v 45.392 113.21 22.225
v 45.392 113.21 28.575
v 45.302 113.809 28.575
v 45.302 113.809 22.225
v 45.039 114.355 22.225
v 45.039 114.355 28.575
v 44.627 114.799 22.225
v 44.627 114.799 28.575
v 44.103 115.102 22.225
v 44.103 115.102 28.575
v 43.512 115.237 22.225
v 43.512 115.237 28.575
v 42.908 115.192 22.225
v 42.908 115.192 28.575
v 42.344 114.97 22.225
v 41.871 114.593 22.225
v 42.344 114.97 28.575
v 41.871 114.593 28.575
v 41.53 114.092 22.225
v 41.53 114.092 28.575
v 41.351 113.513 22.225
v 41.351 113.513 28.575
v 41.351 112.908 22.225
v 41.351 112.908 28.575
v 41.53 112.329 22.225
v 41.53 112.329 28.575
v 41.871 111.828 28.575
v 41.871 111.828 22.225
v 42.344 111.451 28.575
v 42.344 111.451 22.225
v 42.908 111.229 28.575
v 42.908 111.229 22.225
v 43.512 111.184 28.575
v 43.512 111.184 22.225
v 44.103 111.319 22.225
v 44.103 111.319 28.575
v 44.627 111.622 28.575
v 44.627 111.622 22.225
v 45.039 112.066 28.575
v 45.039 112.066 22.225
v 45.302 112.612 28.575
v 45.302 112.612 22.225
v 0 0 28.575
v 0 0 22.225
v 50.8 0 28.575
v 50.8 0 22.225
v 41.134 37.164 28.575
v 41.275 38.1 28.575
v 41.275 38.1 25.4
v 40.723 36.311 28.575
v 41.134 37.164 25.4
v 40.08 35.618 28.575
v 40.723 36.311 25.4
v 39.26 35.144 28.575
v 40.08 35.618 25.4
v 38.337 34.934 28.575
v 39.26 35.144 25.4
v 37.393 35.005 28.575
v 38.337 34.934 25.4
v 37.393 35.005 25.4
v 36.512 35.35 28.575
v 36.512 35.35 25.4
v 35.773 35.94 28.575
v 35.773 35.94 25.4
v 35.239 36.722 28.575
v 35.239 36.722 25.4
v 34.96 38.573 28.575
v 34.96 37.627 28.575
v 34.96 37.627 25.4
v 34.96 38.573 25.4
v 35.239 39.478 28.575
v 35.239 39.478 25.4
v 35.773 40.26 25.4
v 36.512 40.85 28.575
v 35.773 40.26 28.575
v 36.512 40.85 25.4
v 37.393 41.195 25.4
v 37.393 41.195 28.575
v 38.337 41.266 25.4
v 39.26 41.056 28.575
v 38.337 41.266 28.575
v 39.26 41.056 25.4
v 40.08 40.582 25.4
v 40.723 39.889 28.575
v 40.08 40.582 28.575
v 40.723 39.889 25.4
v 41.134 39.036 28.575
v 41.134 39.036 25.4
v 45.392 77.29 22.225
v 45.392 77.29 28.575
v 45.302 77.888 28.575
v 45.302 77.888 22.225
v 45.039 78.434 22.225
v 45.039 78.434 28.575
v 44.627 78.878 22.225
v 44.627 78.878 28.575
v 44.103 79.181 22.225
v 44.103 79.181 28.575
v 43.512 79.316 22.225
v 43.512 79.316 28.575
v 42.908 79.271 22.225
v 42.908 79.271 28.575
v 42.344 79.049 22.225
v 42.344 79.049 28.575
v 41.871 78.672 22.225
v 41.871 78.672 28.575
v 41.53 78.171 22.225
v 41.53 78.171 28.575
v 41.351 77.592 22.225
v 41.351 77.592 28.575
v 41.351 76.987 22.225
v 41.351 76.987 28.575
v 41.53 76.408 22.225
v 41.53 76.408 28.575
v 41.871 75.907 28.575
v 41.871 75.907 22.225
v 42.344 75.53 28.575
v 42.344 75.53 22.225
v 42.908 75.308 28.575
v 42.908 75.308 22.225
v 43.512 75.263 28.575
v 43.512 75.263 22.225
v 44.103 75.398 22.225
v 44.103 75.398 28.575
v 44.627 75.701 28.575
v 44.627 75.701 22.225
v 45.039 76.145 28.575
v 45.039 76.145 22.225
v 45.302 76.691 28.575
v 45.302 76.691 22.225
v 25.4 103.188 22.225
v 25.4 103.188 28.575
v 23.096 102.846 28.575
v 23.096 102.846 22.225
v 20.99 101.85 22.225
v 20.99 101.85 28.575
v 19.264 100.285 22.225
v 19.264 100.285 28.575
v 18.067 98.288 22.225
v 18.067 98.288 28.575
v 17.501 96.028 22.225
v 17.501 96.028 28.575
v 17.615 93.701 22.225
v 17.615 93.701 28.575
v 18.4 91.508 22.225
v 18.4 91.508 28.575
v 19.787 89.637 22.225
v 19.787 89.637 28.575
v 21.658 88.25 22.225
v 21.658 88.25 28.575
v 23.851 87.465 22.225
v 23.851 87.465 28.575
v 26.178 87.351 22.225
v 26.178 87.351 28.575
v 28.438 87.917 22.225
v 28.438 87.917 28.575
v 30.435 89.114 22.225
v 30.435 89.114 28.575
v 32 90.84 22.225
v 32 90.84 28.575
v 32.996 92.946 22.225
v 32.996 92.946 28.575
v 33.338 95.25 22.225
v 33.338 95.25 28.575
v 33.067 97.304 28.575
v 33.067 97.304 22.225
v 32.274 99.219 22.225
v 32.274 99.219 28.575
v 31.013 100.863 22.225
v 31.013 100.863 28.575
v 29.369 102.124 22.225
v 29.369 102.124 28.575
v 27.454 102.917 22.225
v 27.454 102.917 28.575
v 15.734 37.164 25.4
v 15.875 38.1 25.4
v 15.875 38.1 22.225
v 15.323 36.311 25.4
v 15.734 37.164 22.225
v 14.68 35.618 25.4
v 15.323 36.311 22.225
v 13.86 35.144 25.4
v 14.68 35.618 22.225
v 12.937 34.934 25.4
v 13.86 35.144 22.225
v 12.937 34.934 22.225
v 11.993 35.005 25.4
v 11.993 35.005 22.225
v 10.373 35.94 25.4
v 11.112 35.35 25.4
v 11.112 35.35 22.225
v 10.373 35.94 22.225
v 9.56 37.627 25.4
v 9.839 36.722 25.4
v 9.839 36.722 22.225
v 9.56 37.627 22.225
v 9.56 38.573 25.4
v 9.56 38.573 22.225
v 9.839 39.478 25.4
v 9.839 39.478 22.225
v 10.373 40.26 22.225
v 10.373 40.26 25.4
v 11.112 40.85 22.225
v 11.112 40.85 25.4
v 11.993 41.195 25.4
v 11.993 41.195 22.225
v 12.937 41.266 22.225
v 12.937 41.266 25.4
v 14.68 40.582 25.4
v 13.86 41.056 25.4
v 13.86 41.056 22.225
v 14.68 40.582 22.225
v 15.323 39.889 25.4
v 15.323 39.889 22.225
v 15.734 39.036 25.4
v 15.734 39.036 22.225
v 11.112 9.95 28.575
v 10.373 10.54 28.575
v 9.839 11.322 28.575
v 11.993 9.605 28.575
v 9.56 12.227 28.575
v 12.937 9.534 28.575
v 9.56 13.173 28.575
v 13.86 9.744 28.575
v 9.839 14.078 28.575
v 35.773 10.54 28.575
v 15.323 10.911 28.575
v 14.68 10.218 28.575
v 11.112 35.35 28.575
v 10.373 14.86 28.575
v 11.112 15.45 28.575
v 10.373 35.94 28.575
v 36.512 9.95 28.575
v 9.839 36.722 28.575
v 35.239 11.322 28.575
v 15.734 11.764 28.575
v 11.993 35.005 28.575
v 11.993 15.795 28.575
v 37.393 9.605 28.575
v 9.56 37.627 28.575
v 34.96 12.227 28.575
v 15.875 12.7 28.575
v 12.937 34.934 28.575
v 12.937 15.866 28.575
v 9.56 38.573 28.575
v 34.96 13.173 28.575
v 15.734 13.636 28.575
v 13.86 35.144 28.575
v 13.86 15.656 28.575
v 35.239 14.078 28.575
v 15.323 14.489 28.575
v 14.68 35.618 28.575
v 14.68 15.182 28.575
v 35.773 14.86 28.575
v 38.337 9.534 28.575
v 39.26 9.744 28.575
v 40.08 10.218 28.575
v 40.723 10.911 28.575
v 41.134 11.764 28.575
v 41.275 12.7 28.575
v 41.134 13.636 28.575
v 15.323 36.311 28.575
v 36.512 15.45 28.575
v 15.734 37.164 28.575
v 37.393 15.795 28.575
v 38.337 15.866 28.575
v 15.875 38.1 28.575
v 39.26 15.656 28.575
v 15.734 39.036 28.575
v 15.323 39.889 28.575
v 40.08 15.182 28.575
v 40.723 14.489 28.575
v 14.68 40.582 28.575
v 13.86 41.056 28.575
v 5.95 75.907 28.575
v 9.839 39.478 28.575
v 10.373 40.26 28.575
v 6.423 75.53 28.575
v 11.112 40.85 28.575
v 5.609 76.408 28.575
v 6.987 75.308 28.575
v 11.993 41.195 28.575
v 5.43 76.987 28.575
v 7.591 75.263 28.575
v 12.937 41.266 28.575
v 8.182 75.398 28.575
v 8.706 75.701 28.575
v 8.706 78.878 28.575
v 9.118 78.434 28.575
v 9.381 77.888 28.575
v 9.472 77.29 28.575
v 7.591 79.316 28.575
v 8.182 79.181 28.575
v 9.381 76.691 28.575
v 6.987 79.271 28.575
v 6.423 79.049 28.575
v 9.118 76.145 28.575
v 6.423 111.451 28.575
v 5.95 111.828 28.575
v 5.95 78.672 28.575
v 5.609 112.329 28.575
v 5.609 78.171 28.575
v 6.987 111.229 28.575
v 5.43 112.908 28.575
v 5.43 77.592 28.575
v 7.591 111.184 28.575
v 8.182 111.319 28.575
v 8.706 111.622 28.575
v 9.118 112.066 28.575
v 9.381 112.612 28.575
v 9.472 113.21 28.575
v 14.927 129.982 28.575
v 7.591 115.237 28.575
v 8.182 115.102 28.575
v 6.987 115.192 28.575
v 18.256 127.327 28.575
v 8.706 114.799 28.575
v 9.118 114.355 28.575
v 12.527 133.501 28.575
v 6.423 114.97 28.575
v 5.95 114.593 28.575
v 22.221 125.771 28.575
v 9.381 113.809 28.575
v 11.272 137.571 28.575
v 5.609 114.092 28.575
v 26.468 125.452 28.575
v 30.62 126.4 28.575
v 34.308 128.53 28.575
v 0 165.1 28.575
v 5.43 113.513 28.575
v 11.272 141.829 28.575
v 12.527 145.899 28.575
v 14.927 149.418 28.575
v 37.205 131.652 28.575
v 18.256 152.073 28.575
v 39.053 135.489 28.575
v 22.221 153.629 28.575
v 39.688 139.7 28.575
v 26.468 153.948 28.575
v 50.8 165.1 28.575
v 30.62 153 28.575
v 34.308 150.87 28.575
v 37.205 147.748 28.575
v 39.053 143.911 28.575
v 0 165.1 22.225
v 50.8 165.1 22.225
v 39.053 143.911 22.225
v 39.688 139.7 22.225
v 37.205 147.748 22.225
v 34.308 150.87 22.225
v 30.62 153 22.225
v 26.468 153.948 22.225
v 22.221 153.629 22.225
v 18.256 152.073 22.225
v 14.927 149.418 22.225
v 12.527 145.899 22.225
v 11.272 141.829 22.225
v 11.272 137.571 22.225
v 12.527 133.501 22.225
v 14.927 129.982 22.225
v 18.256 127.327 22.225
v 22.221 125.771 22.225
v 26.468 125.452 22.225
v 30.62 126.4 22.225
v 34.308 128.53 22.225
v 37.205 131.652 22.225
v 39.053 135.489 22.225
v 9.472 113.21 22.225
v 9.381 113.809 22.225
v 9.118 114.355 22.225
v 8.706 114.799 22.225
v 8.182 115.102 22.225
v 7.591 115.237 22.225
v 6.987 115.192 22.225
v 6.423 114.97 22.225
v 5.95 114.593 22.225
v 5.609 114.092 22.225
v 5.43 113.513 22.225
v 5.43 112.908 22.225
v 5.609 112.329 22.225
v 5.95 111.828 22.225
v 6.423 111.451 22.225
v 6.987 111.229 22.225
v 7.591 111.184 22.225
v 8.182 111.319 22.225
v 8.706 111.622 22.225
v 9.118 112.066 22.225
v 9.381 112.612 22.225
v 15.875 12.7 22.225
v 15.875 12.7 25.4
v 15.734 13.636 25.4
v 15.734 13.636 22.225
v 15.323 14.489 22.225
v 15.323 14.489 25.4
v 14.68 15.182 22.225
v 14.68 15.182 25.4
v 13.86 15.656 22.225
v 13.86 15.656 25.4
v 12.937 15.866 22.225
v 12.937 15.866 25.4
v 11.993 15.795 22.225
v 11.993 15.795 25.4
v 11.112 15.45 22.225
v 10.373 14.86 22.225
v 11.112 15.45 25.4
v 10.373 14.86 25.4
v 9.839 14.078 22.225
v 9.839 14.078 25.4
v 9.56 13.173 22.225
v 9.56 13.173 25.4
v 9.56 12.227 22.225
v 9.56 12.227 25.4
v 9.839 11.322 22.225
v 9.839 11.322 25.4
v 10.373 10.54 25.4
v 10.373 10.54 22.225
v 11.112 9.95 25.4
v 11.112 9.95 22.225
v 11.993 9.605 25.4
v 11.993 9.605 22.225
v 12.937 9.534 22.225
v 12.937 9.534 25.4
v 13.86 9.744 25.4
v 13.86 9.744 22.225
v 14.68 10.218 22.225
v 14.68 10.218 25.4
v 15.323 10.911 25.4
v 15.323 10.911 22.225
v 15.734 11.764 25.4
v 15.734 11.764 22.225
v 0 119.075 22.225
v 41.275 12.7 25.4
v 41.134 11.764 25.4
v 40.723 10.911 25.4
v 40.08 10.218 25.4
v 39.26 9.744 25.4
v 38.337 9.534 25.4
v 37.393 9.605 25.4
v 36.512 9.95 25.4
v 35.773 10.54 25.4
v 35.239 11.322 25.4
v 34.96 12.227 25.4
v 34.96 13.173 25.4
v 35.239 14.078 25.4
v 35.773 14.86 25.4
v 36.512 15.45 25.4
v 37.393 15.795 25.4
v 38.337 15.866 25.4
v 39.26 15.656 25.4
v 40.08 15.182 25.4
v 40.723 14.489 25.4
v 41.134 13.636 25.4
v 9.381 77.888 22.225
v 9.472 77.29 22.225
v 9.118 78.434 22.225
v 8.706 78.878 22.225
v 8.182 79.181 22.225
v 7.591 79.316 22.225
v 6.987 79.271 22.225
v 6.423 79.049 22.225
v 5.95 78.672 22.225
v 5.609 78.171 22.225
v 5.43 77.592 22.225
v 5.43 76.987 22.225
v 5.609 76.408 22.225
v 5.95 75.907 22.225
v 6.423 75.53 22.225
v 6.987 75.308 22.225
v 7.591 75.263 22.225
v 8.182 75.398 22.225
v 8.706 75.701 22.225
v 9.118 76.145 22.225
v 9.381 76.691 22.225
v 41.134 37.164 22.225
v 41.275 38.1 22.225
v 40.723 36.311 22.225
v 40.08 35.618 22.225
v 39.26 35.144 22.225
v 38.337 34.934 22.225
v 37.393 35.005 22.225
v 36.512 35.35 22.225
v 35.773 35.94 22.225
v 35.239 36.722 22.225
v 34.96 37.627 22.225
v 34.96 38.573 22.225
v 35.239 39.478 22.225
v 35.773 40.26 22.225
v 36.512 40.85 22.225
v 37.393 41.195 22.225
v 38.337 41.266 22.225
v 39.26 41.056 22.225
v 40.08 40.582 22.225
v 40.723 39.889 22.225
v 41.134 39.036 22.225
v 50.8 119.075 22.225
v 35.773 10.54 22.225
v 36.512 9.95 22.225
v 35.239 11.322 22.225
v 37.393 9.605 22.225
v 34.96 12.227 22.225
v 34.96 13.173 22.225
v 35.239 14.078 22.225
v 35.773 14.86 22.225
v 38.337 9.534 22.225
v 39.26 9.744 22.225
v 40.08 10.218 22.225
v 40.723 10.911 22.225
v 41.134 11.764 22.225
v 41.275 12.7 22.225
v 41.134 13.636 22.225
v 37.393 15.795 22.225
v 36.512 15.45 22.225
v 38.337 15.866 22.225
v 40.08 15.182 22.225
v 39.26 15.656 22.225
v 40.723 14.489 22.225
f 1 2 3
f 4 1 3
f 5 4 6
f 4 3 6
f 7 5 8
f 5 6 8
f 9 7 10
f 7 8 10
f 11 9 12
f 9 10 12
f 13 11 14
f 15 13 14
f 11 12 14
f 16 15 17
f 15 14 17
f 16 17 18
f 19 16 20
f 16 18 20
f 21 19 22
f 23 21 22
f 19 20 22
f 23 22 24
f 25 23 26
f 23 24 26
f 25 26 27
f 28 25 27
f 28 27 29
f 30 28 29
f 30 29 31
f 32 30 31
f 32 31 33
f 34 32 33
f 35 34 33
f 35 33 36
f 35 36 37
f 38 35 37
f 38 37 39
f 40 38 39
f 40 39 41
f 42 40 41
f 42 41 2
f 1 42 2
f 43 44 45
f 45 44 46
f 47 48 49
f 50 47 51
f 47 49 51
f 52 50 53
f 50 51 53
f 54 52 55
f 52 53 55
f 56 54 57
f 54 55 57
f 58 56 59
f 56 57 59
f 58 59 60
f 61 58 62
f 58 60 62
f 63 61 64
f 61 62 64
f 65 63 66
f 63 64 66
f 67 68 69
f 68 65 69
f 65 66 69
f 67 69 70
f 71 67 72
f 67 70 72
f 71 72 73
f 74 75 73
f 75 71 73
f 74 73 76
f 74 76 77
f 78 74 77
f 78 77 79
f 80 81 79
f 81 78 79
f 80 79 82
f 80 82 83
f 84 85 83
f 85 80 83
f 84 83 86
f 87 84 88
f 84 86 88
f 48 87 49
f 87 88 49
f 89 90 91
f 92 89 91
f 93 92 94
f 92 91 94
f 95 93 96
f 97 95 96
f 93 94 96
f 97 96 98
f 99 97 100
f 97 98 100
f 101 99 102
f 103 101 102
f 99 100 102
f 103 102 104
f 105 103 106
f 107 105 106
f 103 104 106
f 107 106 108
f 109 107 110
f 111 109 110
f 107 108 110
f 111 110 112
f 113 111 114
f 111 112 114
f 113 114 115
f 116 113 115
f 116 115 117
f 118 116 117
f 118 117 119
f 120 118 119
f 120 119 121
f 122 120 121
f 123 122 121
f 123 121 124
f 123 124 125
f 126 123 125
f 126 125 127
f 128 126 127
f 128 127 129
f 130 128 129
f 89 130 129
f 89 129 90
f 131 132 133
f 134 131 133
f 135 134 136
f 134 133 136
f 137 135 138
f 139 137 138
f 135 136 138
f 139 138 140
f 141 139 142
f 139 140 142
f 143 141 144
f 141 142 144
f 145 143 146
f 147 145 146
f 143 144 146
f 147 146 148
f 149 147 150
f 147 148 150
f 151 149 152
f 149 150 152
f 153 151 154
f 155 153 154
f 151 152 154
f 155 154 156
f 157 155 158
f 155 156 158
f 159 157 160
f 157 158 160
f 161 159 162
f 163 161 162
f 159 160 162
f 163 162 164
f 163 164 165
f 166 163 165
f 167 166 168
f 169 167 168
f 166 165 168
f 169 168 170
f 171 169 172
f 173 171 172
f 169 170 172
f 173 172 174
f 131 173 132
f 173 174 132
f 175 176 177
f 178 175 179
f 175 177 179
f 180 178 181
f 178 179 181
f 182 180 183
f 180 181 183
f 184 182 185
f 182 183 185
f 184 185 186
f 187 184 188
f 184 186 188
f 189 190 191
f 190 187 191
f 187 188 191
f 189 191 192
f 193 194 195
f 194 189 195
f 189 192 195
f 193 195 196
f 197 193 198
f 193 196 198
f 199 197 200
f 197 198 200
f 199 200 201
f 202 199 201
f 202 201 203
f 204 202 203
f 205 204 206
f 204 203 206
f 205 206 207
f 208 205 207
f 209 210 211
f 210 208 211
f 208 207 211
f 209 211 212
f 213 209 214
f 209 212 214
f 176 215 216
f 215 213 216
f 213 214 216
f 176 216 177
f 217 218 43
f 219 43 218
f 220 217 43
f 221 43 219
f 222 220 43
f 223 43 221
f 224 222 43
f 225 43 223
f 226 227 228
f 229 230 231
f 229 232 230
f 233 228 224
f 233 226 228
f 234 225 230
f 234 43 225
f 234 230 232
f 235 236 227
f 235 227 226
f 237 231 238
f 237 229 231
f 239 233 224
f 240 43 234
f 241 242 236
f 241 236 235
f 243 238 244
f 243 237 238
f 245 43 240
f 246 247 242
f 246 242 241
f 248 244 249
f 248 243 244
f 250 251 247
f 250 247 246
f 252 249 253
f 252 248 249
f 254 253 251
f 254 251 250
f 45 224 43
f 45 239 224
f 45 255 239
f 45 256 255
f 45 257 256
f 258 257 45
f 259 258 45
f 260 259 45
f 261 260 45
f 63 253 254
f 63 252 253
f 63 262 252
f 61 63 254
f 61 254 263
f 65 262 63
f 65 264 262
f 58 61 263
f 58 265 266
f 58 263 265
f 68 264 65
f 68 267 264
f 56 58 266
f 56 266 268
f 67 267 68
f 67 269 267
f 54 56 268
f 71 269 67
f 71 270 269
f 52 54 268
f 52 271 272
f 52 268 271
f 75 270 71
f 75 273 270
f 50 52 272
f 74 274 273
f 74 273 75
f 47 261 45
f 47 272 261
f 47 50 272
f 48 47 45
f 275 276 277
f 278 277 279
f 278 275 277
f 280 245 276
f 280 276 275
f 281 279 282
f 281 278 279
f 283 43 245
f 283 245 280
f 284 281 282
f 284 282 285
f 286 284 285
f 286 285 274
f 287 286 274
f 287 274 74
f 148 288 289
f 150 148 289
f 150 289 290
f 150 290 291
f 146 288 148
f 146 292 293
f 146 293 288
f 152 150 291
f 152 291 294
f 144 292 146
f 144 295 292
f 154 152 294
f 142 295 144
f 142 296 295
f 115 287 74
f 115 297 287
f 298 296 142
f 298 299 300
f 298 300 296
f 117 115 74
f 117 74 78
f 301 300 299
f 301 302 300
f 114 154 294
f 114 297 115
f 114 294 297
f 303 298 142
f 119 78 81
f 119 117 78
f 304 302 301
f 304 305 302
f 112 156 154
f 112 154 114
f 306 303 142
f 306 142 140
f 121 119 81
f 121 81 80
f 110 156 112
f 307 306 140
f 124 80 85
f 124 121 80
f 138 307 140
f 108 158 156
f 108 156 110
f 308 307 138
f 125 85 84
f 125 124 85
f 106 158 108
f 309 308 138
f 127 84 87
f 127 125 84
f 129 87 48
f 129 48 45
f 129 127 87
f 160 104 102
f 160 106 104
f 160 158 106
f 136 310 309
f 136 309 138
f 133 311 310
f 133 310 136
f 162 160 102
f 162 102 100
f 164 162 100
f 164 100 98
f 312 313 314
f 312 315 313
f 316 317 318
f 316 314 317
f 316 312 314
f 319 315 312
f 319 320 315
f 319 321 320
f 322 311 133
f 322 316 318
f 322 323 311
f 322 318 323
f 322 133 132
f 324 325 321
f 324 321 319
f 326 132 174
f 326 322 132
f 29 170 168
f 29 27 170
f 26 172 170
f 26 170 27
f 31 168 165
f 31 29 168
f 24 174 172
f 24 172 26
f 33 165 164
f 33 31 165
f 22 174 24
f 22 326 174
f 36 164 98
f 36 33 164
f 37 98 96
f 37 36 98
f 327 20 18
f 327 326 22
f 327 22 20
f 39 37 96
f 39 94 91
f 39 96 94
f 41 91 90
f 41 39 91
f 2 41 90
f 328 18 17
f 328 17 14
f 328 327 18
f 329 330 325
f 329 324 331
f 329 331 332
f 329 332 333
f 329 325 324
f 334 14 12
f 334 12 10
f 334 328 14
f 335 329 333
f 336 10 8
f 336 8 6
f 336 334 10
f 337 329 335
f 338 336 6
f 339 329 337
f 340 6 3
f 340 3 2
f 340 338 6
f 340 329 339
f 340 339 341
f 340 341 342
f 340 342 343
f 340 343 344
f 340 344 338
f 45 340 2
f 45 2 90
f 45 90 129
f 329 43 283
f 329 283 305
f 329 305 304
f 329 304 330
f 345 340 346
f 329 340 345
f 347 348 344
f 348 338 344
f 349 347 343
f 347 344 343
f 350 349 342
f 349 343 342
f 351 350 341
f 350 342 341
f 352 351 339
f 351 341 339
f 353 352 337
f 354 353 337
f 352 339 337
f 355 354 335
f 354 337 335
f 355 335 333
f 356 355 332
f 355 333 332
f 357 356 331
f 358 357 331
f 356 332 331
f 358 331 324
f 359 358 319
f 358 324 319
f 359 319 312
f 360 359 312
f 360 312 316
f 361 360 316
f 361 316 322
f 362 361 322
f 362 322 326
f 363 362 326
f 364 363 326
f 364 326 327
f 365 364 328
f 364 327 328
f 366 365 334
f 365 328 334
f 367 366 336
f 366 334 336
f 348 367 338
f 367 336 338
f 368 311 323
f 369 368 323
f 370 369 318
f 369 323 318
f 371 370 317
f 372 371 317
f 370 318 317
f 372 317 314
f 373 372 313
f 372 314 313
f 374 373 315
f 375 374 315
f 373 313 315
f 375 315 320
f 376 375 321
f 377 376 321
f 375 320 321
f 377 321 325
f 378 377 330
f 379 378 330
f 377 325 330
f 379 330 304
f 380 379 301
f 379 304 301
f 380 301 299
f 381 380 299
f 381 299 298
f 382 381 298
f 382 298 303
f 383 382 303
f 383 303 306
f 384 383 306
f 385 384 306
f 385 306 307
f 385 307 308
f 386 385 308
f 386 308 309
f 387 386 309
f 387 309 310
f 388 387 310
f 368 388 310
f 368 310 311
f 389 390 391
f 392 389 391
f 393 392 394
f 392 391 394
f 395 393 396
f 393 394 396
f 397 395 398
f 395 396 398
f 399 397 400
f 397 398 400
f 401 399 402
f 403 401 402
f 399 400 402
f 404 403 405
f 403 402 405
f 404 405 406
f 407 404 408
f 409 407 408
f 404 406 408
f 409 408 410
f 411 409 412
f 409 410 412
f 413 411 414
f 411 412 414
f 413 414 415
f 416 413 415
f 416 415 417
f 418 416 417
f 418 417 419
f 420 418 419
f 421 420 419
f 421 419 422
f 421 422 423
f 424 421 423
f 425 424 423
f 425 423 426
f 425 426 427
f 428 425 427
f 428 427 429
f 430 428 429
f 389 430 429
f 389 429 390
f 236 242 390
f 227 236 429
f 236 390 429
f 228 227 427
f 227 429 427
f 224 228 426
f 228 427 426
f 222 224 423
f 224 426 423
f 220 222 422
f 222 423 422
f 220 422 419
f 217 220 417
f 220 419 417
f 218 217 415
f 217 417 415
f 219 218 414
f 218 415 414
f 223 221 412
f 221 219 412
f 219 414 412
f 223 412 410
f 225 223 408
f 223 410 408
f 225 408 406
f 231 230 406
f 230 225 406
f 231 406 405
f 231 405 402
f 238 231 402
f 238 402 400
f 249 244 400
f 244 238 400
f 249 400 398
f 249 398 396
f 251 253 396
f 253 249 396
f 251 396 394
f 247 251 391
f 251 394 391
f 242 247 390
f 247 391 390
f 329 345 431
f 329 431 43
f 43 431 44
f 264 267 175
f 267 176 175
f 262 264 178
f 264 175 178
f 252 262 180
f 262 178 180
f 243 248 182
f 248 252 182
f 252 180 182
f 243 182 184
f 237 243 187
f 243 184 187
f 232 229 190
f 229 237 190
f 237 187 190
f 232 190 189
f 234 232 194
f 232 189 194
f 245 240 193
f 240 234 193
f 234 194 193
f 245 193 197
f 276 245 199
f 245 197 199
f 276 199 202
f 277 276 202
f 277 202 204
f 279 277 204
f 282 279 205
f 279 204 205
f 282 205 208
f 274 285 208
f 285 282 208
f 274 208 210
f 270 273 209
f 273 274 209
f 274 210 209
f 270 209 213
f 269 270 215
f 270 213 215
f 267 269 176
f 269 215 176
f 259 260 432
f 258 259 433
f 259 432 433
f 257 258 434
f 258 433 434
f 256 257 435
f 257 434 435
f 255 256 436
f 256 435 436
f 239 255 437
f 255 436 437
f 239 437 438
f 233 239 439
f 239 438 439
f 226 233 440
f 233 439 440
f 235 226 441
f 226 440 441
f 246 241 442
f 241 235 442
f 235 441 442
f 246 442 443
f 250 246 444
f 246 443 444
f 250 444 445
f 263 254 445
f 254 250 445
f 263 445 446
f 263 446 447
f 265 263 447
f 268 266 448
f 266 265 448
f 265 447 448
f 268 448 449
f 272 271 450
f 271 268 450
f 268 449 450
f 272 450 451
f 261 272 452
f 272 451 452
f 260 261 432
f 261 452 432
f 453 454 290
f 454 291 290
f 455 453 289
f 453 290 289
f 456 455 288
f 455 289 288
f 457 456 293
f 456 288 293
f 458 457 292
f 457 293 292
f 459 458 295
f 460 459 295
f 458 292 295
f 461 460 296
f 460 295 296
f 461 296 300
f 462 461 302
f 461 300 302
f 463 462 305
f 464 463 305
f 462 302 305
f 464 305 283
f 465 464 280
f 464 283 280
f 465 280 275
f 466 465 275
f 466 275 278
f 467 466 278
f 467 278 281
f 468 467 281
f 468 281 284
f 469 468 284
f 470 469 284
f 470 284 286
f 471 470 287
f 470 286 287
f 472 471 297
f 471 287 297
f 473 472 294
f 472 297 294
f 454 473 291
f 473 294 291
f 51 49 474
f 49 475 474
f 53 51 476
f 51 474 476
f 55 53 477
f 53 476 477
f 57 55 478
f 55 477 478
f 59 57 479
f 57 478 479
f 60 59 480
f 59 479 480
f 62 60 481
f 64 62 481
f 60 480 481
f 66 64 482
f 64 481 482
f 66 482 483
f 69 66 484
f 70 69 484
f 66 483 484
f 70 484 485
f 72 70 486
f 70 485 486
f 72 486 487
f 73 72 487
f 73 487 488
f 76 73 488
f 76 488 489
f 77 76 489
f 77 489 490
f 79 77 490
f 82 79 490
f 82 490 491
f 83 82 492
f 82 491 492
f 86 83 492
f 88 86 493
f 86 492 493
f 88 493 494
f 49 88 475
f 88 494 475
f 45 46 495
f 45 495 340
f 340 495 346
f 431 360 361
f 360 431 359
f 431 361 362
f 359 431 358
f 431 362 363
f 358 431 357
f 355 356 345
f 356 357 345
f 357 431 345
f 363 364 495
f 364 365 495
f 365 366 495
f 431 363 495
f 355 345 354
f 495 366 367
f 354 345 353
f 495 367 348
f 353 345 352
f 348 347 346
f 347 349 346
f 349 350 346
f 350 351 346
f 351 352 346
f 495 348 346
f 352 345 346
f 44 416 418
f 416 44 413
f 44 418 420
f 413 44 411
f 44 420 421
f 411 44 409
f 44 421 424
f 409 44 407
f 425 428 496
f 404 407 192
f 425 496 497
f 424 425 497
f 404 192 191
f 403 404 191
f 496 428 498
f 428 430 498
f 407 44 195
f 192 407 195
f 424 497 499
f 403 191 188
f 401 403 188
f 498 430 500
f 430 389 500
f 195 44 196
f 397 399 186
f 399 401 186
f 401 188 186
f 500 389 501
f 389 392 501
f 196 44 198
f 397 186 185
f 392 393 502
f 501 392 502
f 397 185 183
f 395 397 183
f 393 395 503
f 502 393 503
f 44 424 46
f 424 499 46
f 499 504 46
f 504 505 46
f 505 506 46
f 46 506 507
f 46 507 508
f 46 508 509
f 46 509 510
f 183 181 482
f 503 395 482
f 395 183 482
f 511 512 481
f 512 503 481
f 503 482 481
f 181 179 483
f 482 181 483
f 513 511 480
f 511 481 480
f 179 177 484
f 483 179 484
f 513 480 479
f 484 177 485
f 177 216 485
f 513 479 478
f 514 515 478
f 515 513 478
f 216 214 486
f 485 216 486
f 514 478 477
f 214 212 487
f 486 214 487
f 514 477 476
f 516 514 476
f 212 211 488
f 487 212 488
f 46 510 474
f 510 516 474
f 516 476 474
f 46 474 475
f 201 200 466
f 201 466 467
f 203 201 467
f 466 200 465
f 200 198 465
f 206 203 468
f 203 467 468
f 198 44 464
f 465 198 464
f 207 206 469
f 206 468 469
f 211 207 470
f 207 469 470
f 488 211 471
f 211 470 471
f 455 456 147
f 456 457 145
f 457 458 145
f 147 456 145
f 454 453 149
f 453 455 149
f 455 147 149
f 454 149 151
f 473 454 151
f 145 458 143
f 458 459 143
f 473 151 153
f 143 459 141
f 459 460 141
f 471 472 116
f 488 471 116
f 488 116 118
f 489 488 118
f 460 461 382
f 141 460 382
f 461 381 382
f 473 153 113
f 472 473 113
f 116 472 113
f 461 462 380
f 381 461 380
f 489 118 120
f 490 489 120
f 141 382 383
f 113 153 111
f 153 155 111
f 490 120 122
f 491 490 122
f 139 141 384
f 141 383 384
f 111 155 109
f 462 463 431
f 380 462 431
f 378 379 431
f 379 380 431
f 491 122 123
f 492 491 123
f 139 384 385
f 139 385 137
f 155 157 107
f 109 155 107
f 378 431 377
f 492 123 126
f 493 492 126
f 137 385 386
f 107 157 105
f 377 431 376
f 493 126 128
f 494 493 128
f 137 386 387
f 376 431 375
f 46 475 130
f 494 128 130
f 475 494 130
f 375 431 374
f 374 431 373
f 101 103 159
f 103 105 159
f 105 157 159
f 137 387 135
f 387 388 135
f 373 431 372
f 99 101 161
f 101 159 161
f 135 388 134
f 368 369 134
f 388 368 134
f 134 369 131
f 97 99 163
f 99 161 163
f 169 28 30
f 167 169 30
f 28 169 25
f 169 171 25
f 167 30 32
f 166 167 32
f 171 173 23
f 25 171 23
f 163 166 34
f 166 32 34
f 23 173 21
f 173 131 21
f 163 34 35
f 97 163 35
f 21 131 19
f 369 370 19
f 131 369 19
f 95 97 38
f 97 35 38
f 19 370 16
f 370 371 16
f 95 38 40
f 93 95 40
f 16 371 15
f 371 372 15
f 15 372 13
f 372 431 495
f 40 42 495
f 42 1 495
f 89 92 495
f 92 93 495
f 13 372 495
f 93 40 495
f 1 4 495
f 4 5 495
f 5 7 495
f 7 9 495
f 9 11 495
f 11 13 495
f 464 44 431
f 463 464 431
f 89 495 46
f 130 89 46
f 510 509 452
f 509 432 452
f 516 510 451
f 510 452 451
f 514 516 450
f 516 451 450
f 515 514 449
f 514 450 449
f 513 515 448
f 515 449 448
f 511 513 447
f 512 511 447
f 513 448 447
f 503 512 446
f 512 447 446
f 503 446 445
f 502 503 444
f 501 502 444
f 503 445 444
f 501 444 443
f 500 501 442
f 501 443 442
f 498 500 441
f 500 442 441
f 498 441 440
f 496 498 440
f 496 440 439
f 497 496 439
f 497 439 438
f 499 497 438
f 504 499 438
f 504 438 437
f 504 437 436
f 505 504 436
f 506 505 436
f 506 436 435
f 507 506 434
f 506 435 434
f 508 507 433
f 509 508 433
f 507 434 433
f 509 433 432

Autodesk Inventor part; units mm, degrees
ref_plane "YZ Plane" through (0, 0, 0) normal (1, 0, 0) x (0, 1, 0)
ref_plane "XZ Plane" through (0, 0, 0) normal (0, 1, 0) x (-1, 0, 0)
ref_plane "XY Plane" through (0, 0, 0) normal (0, 0, 1) x (1, 0, 0)
sketch "Sketch1" plane through (0, 0, 0) normal (0, 0, 1) x (1, 0, 0)
  line L0 (0, 0) -> (50.8, 0)
  line L1 (50.8, 0) -> (50.8, 169.8752)
  line L2 (50.8, 169.8752) -> (0, 169.8752)
  line L3 (0, 169.8752) -> (0, 0)
  line L4 (25.4, 169.8752) -> (25.4, 144.4752)
  line L5 (25.4, 169.8752) -> (50.8, 169.8752) construction
  circle A0 centre (25.4, 144.4752) radius 14.2875
  line L6 (25.4, 144.4752) -> (43.3605, 162.4357)
  line L7 (25.4, 144.4752) -> (50.8, 144.4752) construction
  line L8 (7.4395, 126.5147) -> (43.3605, 126.5147)
  line L9 (43.3605, 162.4357) -> (7.4395, 162.4357)
  line L10 (7.4395, 162.4357) -> (7.4395, 126.5147)
  circle A1 centre (7.4395, 162.4357) radius 2.032
  circle A2 centre (7.4395, 126.5147) radius 2.032
  circle A3 centre (43.3605, 162.4357) radius 2.032
  circle A4 centre (43.3605, 126.5147) radius 2.032
  line L11 (0, 0) -> (50.8, 0)
  line L12 (50.8, 0) -> (50.8, 38.1)
  line L13 (0, 38.1) -> (0, 0)
  line L14 (25.4, 38.1) -> (12.7, 38.1)
  line L15 (25.4, 38.1) -> (38.1, 38.1) construction
  line L16 (12.7, 38.1) -> (38.1, 38.1)
  circle A5 centre (12.7, 38.1) radius 3.175
  circle A6 centre (38.1, 38.1) radius 3.175
  dimension "d0" = 50.8
  dimension "d1" = 169.8752
  dimension "d2" = 25.4
  dimension "d3" = 90
  dimension "d4" = 28.575
  dimension "d5" = 25.4
  dimension "d6" = 45
  dimension "d7" = 50.8
  dimension "d9" = 4.064
  dimension "d10" = 4.064
  dimension "d11" = 4.064
  dimension "d12" = 4.064
  dimension "d13" = 50.8
  dimension "d14" = 38.1
  dimension "d15" = 12.7
  dimension "d16" = 180
  dimension "d17" = 25.4
  dimension "d18" = 0
  dimension "d19" = 6.35
  dimension "d20" = 6.35
extrude "Extrusion1" add sketch "Sketch1" along normal blind 25.4 contours L9 A3 L6 A0 L4 | L3 L2 L1 L0
sketch "Sketch2" plane through (0, 169.8752, 0) normal (0, 1, 0) x (1, 0, 0)
  line L0 (0, 0) -> (3.175, 0)
  line L1 (3.175, 0) -> (3.175, -3.175)
  line L2 (3.175, -3.175) -> (0, -3.175)
  line L3 (0, -3.175) -> (0, 0)
  line L4 (3.175, -3.175) -> (47.625, -3.175)
  line L5 (47.625, -3.175) -> (47.625, -22.225)
  line L6 (47.625, -22.225) -> (3.175, -22.225)
  line L7 (3.175, -22.225) -> (3.175, -3.175)
  dimension "d23" = 3.175
  dimension "d24" = 3.175
  dimension "d25" = 44.45
  dimension "d26" = 19.05
extrude "Extrusion2" cut sketch "Sketch2" against normal blind 254 contours L4 L5 L6 L7
sketch "Sketch3" plane through (0, 0, 25.4) normal (0, 0, 1) x (1, 0, 0)
  circle A0 centre (12.7, 38.1) radius 3.175 projected
  line L0 (12.7, 38.1) -> (38.1, 38.1)
  line L1 (38.1, 38.1) -> (38.1, 12.7)
  line L2 (38.1, 12.7) -> (12.7, 12.7)
  line L3 (12.7, 12.7) -> (12.7, 38.1)
  circle A1 centre (12.7, 12.7) radius 3.175
  circle A2 centre (38.1, 12.7) radius 3.175
  dimension "d29" = 25.4
  dimension "d30" = 25.4
  dimension "d31" = 6.35
  dimension "d32" = 6.35
extrude "Extrusion3" cut sketch "Sketch3" against normal blind 25.4 contours A1 L2 L3 | L3 L2 A1 | A2 L2 L1 | L1 L2 A2
sketch "Sketch4" plane through (0, 169.8752, 0) normal (0, 1, 0) x (1, 0, 0)
  line L0 (47.625, -22.225) -> (3.175, -22.225) projected
  line L1 (3.175, -22.225) -> (3.175, -3.175) projected
  line L2 (3.175, -3.175) -> (47.625, -3.175) projected
  line L3 (47.625, -3.175) -> (47.625, -22.225) projected
  line L4 (50.8, 0) -> (50.8, -25.4) projected
  line L5 (0, 0) -> (50.8, 0)
  line L6 (50.8, 0) -> (50.8, -22.225)
  line L7 (50.8, -22.225) -> (0, -22.225)
  line L8 (0, -22.225) -> (0, 0)
extrude "Extrusion4" cut sketch "Sketch4" against normal blind 254 contours L3 L2 L1 L7 L8 L5 L4
sketch "Sketch5" plane through (0, 0, 25.4) normal (0, 0, 1) x (1, 0, 0)
  circle A0 centre (38.1, 12.7) radius 3.175 projected
  circle A1 centre (12.7, 12.7) radius 3.175 projected
  circle A2 centre (25.4, 144.4752) radius 14.2875 projected
  circle A3 centre (38.1, 38.1) radius 3.175 projected
  circle A4 centre (12.7, 38.1) radius 3.175 projected
  circle A5 centre (43.3605, 126.5147) radius 2.032 projected
  circle A6 centre (43.3605, 162.4357) radius 2.032 projected
  circle A7 centre (7.4395, 126.5147) radius 2.032 projected
  circle A8 centre (7.4395, 162.4357) radius 2.032 projected
  line L0 (0, 0) -> (50.8, 0) projected
  line L1 (50.8, 0) -> (50.8, 169.8752) projected
  line L2 (50.8, 169.8752) -> (0, 169.8752) projected
  line L3 (0, 169.8752) -> (0, 0) projected
extrude "Extrusion5" add sketch "Sketch5" along normal blind 3.175
sketch "Sketch6" plane through (0, 0, 28.575) normal (0, 0, 1) x (1, 0, 0)
  circle A0 centre (25.4, 144.4752) radius 14.2875 projected
  circle A1 centre (25.4, 144.4752) radius 9.525
  dimension "d39" = 19.05
extrude "Extrusion6" add sketch "Sketch6" against normal blind 6.35
sketch "Sketch7" plane through (0, 0, 28.575) normal (0, 0, 1) x (1, 0, 0)
  line L0 (50.8, 169.8752) -> (0, 169.8752) projected
  line L1 (0, 169.8752) -> (0, 0) projected
  line L2 (25.4, 169.8752) -> (25.4, 95.25)
  line L3 (25.4, 169.8752) -> (100.0252, 169.8752) construction
  circle A0 centre (25.4, 95.25) radius 7.9375
  dimension "d43" = 74.6252
  dimension "d44" = 90
  dimension "d45" = 15.875
extrude "Extrusion7" cut sketch "Sketch7" against normal blind 25.4
sketch "Sketch8" plane through (0, 0, 28.575) normal (0, 0, 1) x (1, 0, 0)
  circle A0 centre (25.4, 144.4752) radius 9.525 projected
  circle A1 centre (25.4, 144.4752) radius 14.2875
  dimension "d48" = 28.575
extrude "Extrusion8" cut sketch "Sketch8" against normal blind 25.4
sketch "Sketch9" plane through (0, 0, 28.575) normal (0, 0, 1) x (1, 0, 0)
  circle A0 centre (25.4, 95.25) radius 7.9375 projected
  circle A1 centre (7.4395, 162.4357) radius 2.032 projected
  circle A2 centre (7.4395, 126.5147) radius 2.032 projected
  circle A3 centre (43.3605, 162.4357) radius 2.032 projected
  circle A4 centre (43.3605, 126.5147) radius 2.032 projected
  line L0 (25.4, 95.25) -> (43.3605, 113.2105)
  line L1 (25.4, 95.25) -> (50.8, 95.25) construction
  line L2 (43.3605, 113.2105) -> (7.4395, 77.2895)
  circle A5 centre (7.4395, 113.2105) radius 2.032
  circle A6 centre (43.3605, 113.2105) radius 2.032
  circle A7 centre (43.3605, 77.2895) radius 2.032
  circle A8 centre (7.4395, 77.2895) radius 2.032
  dimension "d51" = 25.4
  dimension "d52" = 45
  dimension "d53" = 50.8
  dimension "d54" = 0
  dimension "d55" = 4.064
  dimension "d56" = 4.064
  dimension "d57" = 4.064
  dimension "d58" = 4.064
extrude "Extrusion9" cut sketch "Sketch9" against normal blind 6.35 contours A8 | A6 | A1 | A2 | A3 | A4 | A5 | A7
sketch "Sketch10" plane through (0, 0, 28.575) normal (0, 0, 1) x (1, 0, 0)
  circle A0 centre (7.4395, 162.4357) radius 2.032 projected
  circle A1 centre (7.4395, 126.5147) radius 2.032 projected
  circle A2 centre (43.3605, 162.4357) radius 2.032 projected
  circle A3 centre (43.3605, 126.5147) radius 2.032 projected
extrude "Extrusion10" add sketch "Sketch10" against normal blind 6.35
sketch "Sketch11" plane through (0, 0, 28.575) normal (0, 0, 1) x (1, 0, 0)
  circle A0 centre (25.4, 144.4752) radius 14.2875 projected
  line L0 (0, 169.8752) -> (50.8, 169.8752)
  line L1 (50.8, 169.8752) -> (50.8, 119.0752)
  line L2 (50.8, 119.0752) -> (0, 119.0752)
  line L3 (0, 119.0752) -> (0, 169.8752)
  dimension "d64" = 50.8
  dimension "d65" = 50.8
extrude "Extrusion11" cut sketch "Sketch11" against normal blind 25.4
sketch "Sketch12" plane through (0, 0, 28.575) normal (0, 0, 1) x (1, 0, 0)
  line L0 (50.8, 0) -> (50.8, 119.0752) projected
  circle A0 centre (25.4, 95.25) radius 7.9375 projected
  line L1 (25.4, 95.25) -> (25.4, 139.7)
  line L2 (25.4, 95.25) -> (69.85, 95.25) construction
  circle A1 centre (25.4, 139.7) radius 14.2875
  line L3 (25.4, 139.7) -> (25.4, 165.1)
  line L4 (25.4, 139.7) -> (50.8, 139.7) construction
  line L5 (25.4, 165.1) -> (0, 165.1)
  line L6 (0, 165.1) -> (50.8, 165.1)
  line L7 (50.8, 165.1) -> (50.8, 119.0752)
  line L8 (50.8, 119.0752) -> (0, 119.0752)
  line L9 (0, 119.0752) -> (0, 165.1)
  dimension "d68" = 44.45
  dimension "d69" = 90
  dimension "d70" = 28.575
  dimension "d71" = 25.4
  dimension "d72" = 90
  dimension "d73" = 25.4
  dimension "d74" = 90
extrude "Extrusion12" add sketch "Sketch12" against normal blind 6.35 contours L8 L9 L5 L3 A1 L1 | L1 A1 L3 L6 L7 L8
properties part number "Z-Plate-Gears"
